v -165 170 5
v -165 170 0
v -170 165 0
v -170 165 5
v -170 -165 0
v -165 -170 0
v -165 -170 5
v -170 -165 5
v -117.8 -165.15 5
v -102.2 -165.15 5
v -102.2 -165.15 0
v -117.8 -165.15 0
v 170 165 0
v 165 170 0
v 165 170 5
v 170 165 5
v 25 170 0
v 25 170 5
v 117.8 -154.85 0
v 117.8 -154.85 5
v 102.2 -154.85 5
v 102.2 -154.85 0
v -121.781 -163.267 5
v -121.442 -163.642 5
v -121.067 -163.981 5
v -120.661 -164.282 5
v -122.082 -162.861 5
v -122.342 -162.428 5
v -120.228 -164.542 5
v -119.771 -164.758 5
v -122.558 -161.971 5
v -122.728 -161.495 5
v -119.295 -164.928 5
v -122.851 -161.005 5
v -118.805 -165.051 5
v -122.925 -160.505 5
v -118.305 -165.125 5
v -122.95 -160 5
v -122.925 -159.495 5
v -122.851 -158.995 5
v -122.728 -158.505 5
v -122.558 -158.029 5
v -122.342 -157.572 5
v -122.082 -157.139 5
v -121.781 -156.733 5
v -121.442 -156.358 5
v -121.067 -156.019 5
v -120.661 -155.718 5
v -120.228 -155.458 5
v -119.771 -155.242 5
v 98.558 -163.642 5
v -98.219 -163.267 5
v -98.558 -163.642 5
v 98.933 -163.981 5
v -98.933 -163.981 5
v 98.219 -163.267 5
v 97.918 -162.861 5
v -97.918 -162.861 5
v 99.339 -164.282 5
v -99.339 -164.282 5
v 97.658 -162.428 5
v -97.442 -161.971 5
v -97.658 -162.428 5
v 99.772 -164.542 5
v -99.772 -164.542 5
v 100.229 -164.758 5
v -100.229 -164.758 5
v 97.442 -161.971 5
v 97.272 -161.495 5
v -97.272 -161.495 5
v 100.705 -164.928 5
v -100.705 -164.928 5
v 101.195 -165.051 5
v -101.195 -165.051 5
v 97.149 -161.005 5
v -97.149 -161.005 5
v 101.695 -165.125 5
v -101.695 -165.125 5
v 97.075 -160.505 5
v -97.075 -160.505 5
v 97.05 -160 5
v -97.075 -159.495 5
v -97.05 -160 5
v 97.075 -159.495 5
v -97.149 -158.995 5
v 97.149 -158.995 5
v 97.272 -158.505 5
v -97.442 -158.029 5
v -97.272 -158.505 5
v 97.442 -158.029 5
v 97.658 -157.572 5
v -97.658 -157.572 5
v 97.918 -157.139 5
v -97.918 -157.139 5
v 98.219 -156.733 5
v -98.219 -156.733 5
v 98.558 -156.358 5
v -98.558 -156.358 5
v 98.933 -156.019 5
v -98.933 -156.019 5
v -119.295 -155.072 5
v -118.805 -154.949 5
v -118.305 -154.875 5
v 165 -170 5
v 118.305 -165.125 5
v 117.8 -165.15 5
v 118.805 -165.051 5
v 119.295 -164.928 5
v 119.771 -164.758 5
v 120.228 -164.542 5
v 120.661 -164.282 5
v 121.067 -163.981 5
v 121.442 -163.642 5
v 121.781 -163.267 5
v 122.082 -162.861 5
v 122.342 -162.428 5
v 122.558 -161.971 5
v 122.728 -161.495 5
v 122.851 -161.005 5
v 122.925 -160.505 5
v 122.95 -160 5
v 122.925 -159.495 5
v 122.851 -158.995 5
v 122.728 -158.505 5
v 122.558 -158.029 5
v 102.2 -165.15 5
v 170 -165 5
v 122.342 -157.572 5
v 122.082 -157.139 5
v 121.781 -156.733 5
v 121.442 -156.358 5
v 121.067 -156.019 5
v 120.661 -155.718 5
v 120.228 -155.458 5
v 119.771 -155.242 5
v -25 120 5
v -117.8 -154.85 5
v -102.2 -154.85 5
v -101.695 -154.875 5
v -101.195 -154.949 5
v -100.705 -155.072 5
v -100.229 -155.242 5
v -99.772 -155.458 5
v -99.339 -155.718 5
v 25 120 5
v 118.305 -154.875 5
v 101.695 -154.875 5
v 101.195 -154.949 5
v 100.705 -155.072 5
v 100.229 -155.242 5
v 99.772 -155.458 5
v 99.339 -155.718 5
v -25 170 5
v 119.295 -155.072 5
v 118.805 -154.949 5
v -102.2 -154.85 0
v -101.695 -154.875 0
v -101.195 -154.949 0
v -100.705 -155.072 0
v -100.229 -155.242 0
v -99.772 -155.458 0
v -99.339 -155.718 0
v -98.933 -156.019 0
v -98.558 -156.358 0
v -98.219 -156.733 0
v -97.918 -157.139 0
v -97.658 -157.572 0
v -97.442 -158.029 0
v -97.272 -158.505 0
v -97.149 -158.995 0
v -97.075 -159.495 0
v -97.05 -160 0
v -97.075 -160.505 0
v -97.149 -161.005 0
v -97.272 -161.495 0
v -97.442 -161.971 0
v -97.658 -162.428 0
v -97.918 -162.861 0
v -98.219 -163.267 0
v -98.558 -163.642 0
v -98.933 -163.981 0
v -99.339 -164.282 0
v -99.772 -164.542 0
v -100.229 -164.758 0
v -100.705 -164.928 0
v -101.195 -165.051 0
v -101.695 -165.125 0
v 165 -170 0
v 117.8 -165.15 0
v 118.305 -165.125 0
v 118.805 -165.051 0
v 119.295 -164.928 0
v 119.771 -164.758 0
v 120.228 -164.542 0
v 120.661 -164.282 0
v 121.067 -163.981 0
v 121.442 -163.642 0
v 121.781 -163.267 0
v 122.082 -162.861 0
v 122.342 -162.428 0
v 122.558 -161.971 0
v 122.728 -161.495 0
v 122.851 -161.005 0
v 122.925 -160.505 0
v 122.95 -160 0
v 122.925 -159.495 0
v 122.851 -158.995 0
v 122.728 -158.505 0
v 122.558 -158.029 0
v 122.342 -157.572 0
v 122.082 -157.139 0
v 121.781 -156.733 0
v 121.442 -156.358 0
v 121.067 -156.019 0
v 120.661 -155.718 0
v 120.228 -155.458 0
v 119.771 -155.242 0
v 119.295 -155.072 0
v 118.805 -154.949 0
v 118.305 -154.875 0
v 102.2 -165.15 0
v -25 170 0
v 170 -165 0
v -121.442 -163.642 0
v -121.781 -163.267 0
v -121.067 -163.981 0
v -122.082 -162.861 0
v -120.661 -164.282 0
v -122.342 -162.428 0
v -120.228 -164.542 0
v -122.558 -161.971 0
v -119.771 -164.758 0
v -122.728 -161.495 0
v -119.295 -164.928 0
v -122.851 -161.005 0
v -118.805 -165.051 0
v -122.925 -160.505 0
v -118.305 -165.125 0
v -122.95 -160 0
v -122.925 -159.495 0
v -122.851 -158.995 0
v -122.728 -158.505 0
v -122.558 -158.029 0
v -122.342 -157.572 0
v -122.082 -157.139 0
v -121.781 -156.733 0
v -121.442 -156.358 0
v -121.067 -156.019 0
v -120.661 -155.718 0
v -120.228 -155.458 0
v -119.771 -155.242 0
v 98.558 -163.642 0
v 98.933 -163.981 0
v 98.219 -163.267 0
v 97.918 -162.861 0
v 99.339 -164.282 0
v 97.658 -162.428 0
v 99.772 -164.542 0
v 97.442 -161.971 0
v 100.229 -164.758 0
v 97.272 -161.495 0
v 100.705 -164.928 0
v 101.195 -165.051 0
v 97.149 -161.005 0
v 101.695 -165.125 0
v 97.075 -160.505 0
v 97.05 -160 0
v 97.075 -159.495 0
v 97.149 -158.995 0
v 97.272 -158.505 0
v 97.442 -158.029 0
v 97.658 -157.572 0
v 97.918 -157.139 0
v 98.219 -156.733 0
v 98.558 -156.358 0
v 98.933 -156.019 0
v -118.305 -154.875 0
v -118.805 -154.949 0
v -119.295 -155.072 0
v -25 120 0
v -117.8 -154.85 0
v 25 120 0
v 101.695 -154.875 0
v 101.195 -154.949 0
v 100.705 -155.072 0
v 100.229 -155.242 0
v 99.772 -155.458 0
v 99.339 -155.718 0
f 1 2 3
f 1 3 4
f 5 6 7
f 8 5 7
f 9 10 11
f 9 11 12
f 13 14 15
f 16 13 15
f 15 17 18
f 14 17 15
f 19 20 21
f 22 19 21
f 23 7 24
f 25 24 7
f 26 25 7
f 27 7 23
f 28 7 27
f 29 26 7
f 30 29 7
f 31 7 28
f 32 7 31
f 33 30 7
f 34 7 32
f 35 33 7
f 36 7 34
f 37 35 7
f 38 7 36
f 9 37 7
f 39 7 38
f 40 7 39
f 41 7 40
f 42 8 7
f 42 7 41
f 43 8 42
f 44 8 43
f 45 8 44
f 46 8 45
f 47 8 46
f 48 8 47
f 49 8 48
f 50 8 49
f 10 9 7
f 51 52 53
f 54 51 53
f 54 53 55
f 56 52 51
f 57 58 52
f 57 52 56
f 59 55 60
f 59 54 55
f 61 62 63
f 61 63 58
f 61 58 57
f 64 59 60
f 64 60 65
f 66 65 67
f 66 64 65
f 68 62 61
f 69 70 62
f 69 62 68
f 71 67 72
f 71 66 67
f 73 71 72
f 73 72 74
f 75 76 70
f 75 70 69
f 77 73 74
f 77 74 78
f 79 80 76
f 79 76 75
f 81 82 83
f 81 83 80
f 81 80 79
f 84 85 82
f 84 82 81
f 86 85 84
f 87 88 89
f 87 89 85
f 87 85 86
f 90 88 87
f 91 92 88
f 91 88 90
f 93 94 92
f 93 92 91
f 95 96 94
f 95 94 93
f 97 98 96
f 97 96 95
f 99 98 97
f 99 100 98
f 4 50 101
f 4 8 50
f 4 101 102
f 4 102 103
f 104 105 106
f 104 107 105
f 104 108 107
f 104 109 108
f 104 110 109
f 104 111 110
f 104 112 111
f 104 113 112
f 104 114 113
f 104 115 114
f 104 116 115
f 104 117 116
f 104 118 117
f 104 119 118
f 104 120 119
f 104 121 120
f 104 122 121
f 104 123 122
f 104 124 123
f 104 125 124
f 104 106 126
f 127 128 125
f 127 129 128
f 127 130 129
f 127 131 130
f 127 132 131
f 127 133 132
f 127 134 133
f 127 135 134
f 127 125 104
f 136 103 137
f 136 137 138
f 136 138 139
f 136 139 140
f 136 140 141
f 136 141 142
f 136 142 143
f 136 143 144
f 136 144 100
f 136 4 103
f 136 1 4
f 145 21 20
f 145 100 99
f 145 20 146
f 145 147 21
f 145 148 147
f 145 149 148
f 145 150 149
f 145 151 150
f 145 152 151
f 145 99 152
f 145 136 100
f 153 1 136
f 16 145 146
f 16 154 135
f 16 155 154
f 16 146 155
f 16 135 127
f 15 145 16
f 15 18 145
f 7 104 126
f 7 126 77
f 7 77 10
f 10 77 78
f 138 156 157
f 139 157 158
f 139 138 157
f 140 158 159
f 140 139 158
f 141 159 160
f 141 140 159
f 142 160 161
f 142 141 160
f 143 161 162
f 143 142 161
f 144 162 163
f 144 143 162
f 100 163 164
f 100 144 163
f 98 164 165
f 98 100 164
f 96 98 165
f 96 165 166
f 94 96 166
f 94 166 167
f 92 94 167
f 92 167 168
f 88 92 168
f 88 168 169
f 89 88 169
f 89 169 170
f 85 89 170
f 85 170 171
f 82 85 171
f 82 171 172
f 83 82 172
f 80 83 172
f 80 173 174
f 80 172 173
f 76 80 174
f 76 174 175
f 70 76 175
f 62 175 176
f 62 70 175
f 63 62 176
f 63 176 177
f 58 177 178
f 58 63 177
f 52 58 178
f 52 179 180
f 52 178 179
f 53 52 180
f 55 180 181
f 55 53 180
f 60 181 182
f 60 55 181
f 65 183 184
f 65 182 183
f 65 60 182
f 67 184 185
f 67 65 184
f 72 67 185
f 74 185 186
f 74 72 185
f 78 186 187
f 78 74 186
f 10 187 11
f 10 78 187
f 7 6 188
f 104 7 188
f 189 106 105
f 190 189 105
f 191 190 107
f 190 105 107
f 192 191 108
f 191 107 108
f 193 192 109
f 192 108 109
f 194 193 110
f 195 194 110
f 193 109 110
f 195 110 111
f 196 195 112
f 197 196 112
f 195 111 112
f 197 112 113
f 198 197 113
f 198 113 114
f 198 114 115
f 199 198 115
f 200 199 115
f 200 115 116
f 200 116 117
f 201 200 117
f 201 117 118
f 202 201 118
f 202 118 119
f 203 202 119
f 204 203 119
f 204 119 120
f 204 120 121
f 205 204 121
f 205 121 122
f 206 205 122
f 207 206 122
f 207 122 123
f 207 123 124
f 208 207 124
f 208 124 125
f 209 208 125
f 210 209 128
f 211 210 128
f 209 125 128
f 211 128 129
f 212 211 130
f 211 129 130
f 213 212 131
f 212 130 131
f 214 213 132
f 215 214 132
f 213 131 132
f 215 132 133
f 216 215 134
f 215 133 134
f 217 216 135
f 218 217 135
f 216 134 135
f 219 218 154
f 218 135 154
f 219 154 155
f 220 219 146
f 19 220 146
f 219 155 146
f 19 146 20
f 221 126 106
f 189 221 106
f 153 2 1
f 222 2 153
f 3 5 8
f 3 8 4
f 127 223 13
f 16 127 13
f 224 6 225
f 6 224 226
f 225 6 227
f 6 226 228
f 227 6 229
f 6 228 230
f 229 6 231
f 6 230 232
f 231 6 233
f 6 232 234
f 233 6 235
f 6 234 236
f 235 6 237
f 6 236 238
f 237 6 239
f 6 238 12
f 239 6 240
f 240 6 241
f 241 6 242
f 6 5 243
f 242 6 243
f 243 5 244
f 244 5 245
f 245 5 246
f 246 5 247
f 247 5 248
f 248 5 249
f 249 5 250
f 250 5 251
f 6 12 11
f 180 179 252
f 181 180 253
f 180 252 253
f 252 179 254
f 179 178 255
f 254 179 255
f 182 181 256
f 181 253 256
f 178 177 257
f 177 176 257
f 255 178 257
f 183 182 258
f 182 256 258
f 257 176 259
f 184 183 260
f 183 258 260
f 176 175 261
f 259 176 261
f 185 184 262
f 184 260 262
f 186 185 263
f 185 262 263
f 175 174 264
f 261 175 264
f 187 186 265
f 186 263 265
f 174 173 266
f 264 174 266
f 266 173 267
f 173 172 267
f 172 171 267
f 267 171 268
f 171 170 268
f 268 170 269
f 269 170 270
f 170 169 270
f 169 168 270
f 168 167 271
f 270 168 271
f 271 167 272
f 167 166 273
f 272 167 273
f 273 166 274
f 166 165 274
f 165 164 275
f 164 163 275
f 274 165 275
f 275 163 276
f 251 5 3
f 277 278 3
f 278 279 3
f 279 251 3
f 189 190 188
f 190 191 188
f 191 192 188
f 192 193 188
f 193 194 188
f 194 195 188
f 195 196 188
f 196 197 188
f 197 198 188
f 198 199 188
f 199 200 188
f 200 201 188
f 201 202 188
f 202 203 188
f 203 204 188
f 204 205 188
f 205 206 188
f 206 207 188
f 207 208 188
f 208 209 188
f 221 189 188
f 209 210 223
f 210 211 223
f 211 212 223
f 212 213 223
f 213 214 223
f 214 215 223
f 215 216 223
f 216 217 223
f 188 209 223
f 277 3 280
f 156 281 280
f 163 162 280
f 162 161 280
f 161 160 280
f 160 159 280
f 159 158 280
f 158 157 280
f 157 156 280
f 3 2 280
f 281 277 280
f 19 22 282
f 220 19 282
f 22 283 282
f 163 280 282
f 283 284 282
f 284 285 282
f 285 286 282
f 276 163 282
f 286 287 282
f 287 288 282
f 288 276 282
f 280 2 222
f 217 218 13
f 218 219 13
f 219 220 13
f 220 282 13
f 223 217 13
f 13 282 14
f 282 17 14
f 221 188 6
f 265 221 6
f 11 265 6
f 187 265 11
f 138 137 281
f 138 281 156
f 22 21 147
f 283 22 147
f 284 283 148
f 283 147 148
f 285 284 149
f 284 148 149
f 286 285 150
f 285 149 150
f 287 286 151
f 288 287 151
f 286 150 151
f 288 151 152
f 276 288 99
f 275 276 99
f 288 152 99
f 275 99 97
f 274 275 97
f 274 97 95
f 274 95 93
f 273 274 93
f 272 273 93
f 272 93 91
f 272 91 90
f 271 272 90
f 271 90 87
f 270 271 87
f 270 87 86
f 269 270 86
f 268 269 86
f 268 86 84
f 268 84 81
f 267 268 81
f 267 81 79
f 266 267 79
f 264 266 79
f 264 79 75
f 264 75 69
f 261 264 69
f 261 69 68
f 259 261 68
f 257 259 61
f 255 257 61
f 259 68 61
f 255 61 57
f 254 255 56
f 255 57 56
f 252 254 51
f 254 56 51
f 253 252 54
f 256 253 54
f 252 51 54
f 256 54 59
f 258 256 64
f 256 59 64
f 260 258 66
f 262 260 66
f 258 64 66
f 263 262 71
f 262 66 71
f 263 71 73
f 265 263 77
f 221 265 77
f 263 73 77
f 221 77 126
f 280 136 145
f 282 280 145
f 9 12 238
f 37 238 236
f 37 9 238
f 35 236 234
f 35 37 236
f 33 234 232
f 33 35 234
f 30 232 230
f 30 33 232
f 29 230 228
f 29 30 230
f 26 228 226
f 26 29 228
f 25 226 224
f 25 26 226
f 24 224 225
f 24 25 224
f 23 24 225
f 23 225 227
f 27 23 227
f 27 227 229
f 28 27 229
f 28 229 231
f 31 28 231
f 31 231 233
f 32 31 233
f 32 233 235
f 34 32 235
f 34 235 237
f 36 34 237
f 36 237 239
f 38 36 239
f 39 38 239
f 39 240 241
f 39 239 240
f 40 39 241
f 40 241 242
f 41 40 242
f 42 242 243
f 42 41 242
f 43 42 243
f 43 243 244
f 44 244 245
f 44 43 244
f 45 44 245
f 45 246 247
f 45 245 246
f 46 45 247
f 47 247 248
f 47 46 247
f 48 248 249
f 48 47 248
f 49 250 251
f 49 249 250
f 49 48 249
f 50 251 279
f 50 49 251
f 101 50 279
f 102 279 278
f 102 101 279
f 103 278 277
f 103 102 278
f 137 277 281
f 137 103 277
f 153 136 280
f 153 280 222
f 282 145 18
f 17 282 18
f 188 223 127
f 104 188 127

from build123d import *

# Parameters (mm, degrees)
SKETCH2_W           = 340
SKETCH2_H           = 340
BOSS_EXTRUDE1_DEPTH = 5
CHAMFER1_SIZE       = 5
CUT_EXTRUDE2_DEPTH  = 241.468293128
SKETCH5_W           = 50
SKETCH5_H           = 50
CUT_EXTRUDE3_DEPTH  = 241.468293128


with BuildPart() as part:
    # Sketch2 → Boss-Extrude1 (new body)
    with BuildSketch(Plane.XY):
        Rectangle(SKETCH2_W, SKETCH2_H)
    extrude(amount=BOSS_EXTRUDE1_DEPTH)

    # Chamfer1
    chamfer1_edges = [part.edges().sort_by_distance(p)[0] for p in [
        (170, -170, 2.5),
        (-170, -170, 2.5),
        (-170, 170, 2.5),
        (170, 170, 2.5),
    ]]
    chamfer(chamfer1_edges, length=CHAMFER1_SIZE)

    # Sketch4 → Cut-Extrude2 (cut, through all)
    with BuildSketch(Plane.XY.offset(5)):
        with BuildLine():
            Line((-7.8, 164.9), (7.8, 164.9))
            ThreePointArc((7.8, 164.9), (12.7, 160), (7.8, 155.1))
            Line((7.8, 155.1), (-7.8, 155.1))
            ThreePointArc((-7.8, 155.1), (-12.7, 160), (-7.8, 164.9))
        make_face()
        with BuildLine():
            Line((-117.8, -154.85), (-102.2, -154.85))
            ThreePointArc((-102.2, -154.85), (-97.05, -160), (-102.2, -165.15))
            Line((-102.2, -165.15), (-117.8, -165.15))
            ThreePointArc((-117.8, -165.15), (-122.95, -160), (-117.8, -154.85))
        make_face()
    cut_extrude2 = extrude(amount=-CUT_EXTRUDE2_DEPTH, mode=Mode.SUBTRACT)

    # Mirror1: Cut-Extrude2 across plane
    add(cut_extrude2.mirror(Plane(origin=(0, 0, 0), x_dir=(0, 0, 1), z_dir=(1, 0, 0))), mode=Mode.SUBTRACT)

    # Sketch5 → Cut-Extrude3 (cut, through all)
    with BuildSketch(Plane.XY.offset(5)):
        with Locations((0, 145)):
            Rectangle(SKETCH5_W, SKETCH5_H)
    extrude(amount=-CUT_EXTRUDE3_DEPTH, mode=Mode.SUBTRACT)


solid = part.part
